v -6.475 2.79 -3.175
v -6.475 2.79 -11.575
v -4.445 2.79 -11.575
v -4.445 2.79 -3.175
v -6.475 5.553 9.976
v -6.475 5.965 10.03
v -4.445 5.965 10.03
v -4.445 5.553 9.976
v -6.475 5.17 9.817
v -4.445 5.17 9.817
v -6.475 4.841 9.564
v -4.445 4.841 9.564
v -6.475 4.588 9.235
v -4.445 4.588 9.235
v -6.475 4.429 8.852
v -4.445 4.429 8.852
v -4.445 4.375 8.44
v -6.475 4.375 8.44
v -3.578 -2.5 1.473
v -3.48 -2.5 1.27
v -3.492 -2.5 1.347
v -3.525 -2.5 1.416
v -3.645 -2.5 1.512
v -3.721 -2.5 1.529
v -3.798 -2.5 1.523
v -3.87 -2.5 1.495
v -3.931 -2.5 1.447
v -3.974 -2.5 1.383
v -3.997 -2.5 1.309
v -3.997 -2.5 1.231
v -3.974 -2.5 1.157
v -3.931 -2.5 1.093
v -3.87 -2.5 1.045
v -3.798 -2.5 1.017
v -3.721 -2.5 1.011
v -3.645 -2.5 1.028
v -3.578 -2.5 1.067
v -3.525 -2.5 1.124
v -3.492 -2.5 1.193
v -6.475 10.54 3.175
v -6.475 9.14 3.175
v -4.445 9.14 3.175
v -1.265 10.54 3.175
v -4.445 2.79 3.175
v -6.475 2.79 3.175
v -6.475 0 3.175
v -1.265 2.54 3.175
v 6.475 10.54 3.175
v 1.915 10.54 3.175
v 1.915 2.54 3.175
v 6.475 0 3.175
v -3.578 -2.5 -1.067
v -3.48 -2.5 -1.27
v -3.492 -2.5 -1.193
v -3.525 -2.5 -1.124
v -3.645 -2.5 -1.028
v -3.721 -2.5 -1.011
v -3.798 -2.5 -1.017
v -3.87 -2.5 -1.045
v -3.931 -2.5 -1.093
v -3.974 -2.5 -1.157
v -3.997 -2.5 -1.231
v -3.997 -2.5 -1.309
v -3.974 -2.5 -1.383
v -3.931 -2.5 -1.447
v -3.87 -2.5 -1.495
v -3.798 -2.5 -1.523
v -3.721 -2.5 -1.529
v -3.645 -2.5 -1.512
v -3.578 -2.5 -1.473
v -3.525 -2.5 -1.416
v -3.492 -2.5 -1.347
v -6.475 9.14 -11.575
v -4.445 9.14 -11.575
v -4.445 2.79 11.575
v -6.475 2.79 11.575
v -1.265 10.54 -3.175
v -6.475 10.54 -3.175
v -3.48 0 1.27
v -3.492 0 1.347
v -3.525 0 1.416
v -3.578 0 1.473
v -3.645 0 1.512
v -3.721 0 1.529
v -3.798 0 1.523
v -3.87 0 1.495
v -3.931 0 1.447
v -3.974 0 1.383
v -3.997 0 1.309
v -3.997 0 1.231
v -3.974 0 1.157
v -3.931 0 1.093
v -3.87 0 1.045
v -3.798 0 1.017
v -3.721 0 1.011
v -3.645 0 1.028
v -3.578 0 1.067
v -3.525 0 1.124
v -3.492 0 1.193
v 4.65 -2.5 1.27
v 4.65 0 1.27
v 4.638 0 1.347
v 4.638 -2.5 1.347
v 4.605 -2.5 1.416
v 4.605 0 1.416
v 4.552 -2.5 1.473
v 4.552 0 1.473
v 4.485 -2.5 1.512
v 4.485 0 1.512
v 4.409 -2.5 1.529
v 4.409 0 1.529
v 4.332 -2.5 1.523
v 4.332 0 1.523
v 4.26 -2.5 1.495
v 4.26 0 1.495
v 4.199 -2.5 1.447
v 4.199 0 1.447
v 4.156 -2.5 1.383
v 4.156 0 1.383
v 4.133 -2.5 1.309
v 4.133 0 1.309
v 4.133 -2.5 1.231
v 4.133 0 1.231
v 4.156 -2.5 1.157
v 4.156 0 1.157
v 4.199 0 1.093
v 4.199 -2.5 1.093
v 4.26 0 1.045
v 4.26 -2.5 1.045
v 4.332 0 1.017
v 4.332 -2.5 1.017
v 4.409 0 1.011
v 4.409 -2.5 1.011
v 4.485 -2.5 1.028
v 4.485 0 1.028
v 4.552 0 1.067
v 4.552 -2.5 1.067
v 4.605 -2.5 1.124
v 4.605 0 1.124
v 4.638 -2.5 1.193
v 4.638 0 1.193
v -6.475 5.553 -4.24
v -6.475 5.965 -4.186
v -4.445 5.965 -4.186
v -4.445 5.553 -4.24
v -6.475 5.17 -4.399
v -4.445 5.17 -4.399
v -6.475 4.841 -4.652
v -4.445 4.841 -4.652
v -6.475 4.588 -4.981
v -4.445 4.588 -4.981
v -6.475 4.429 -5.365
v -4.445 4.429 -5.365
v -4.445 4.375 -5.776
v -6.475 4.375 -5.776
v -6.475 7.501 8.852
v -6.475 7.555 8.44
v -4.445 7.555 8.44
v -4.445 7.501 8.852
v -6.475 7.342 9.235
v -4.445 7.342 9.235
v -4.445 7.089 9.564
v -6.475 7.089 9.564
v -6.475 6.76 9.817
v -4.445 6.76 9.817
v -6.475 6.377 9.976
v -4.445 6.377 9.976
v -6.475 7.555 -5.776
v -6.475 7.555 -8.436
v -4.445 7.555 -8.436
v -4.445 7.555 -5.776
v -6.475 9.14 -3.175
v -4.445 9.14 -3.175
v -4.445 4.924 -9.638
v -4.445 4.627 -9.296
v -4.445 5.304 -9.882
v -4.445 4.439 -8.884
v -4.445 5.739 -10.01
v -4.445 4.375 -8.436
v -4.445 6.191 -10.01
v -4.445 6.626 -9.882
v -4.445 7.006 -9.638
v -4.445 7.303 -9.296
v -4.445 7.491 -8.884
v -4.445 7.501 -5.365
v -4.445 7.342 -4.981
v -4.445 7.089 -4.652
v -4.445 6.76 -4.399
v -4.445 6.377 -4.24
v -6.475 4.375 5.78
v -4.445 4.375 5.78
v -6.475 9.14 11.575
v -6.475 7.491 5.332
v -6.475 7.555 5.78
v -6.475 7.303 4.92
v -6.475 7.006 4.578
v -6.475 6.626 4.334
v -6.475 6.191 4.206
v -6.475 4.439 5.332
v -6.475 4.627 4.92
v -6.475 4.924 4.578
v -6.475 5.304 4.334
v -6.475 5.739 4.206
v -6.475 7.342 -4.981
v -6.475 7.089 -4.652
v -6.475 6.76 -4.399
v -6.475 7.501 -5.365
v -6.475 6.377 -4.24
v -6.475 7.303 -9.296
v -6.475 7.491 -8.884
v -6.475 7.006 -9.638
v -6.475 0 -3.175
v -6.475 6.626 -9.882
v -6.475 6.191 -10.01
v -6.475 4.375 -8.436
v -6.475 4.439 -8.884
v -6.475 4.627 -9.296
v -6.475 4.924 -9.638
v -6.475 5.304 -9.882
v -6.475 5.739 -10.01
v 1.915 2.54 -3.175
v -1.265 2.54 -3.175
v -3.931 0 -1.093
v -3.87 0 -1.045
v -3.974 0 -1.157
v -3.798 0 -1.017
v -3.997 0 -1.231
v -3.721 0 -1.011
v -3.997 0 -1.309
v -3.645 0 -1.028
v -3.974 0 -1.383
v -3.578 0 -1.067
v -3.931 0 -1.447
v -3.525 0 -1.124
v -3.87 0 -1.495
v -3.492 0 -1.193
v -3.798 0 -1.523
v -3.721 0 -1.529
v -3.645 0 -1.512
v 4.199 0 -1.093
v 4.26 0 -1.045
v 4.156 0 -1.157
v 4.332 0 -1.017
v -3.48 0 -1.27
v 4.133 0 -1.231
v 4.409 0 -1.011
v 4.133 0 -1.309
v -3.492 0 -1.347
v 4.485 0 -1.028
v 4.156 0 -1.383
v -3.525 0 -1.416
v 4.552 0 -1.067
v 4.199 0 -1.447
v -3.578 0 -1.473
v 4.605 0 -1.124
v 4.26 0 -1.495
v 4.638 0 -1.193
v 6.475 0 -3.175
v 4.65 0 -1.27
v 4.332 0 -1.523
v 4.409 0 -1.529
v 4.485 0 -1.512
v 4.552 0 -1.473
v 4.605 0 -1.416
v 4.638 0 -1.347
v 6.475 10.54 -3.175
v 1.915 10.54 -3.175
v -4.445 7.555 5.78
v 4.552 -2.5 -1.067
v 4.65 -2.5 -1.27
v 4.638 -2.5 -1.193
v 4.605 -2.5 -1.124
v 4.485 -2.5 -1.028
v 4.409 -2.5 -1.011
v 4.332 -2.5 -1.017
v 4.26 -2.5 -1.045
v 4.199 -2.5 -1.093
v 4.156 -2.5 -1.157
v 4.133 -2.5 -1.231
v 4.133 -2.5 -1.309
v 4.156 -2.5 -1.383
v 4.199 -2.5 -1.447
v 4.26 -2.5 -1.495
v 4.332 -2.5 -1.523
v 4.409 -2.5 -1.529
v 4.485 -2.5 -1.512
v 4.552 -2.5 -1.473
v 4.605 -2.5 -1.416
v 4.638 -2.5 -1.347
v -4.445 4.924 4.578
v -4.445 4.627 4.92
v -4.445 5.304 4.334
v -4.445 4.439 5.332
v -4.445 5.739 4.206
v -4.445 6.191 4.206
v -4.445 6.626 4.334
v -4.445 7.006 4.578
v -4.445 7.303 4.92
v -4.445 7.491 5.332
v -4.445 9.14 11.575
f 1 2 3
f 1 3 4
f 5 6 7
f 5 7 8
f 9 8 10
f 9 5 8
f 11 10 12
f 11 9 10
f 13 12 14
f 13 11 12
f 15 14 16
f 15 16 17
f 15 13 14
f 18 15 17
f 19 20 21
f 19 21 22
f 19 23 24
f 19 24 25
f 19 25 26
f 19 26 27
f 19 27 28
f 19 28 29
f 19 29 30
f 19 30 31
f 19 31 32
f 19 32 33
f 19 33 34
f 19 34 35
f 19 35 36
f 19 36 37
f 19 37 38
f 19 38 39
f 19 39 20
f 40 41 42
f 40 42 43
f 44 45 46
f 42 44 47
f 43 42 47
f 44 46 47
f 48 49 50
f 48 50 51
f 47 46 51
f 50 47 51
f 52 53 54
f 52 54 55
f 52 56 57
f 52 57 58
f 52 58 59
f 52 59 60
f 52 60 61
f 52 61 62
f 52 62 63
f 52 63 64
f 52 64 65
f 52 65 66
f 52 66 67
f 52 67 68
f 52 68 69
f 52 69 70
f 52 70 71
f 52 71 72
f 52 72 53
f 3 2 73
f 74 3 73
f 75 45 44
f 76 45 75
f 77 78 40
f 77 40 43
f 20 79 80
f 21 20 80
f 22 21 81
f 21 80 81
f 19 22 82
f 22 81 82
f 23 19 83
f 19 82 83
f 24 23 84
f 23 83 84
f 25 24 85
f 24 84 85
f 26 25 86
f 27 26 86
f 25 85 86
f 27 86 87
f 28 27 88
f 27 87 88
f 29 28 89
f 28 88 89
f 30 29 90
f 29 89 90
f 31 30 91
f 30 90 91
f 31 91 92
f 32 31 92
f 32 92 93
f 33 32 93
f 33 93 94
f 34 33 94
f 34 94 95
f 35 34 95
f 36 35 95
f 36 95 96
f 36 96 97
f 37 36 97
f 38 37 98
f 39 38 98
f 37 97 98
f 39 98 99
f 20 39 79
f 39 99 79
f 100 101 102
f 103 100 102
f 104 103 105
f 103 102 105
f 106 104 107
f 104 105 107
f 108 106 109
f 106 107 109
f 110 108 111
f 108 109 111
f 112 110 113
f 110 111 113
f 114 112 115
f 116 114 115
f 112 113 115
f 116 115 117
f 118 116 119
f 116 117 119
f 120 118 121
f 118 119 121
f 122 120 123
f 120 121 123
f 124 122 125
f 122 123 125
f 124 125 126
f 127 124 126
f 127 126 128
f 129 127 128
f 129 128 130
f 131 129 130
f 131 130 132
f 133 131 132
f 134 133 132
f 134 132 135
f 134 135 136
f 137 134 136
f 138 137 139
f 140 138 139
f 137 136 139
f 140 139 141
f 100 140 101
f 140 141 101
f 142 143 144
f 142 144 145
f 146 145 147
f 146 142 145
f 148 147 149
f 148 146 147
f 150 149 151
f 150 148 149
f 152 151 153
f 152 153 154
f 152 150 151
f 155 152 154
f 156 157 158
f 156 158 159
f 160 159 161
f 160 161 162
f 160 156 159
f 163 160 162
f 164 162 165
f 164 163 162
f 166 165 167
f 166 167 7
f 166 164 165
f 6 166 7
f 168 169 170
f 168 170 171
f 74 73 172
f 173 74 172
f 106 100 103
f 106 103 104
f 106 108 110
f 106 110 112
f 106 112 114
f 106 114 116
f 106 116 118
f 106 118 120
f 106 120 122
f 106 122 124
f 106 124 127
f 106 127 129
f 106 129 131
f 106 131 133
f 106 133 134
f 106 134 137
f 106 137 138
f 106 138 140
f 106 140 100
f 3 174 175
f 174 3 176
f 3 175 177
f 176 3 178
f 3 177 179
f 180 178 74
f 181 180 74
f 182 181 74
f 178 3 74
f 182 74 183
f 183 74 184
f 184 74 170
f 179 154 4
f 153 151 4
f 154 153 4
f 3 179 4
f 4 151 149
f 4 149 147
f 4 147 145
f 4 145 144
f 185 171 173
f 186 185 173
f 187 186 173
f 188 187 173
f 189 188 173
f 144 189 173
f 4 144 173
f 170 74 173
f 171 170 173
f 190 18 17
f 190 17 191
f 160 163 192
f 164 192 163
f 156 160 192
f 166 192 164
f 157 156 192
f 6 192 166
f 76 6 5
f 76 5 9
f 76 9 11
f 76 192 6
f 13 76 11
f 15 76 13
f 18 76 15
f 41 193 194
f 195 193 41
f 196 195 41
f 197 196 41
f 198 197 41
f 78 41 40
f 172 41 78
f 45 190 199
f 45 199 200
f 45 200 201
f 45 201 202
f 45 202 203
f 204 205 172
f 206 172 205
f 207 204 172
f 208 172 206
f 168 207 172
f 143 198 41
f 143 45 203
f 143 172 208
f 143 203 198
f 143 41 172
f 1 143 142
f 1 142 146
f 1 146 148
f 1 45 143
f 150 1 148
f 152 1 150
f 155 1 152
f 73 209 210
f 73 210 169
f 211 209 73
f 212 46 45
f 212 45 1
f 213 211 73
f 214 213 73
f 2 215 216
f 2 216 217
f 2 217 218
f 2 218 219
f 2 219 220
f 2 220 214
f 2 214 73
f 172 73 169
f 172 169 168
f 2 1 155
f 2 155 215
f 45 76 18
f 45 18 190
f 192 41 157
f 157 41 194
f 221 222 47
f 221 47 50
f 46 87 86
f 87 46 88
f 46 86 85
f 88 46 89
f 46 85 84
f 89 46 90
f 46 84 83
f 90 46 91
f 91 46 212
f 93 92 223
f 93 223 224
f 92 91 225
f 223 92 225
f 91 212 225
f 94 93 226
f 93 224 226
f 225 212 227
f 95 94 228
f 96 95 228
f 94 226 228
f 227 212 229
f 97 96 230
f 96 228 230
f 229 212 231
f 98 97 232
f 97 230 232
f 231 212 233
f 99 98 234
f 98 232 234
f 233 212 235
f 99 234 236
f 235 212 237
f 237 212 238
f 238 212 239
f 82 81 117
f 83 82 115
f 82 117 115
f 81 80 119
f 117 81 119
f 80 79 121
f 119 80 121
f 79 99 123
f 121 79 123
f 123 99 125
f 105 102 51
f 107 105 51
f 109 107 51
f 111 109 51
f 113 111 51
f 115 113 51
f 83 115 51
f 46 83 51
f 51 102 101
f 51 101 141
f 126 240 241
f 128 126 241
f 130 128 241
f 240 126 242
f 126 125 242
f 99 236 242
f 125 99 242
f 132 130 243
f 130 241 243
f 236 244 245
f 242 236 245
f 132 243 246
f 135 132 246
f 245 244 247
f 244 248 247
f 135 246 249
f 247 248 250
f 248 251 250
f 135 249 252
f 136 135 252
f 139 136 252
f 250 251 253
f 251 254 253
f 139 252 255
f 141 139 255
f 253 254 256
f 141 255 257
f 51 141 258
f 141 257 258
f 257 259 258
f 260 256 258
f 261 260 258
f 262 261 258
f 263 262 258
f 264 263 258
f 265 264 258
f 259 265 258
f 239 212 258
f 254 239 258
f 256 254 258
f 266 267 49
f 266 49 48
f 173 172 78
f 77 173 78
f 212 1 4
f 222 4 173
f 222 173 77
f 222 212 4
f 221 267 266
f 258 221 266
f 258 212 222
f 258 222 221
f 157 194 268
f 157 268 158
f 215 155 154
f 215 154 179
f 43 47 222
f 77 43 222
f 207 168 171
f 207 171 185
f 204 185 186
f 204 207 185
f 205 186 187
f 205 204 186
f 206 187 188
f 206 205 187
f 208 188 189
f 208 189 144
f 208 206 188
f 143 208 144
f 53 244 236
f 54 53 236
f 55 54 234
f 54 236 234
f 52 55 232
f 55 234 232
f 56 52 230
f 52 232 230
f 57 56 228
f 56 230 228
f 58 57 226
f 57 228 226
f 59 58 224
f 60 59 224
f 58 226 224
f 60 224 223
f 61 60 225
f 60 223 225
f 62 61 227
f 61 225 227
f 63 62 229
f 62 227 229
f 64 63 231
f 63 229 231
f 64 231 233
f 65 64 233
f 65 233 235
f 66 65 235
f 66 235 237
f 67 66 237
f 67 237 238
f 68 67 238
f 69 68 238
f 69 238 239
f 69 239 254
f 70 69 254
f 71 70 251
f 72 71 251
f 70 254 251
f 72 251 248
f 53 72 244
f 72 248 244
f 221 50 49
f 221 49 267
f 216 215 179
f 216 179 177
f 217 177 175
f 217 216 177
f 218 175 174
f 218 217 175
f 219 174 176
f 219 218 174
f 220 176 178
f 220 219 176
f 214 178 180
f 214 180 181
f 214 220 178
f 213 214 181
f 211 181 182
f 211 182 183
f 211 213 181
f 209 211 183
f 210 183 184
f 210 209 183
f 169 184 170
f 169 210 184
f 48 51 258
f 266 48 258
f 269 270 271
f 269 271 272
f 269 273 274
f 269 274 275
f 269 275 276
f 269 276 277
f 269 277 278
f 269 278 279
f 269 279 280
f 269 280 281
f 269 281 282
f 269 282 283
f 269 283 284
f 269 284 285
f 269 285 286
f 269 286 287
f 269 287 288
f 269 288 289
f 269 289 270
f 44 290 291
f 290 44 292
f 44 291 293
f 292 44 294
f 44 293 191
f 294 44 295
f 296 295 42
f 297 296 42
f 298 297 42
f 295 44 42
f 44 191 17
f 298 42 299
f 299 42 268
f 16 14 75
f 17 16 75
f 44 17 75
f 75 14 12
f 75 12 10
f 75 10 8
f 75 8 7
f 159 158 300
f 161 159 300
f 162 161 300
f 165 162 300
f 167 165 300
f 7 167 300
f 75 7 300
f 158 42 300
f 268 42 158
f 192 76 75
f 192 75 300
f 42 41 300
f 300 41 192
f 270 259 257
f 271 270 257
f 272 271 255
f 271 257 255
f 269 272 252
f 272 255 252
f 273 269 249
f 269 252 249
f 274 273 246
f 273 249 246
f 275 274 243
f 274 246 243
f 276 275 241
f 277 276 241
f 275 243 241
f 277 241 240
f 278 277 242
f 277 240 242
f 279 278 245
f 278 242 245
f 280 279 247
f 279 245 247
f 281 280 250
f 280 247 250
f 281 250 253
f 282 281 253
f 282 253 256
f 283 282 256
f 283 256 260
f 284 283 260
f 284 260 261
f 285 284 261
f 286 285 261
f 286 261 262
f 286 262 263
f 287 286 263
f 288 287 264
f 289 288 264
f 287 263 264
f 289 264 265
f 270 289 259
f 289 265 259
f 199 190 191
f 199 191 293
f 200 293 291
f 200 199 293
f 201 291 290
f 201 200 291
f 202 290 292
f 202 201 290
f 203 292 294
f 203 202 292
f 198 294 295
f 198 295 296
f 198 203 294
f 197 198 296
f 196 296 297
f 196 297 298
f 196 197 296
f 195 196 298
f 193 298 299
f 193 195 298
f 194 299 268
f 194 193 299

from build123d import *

# Parameters (mm, degrees)
SKETCH2_W           = 12.95
SKETCH2_H           = 6.35
BOSS_EXTRUDE1_DEPTH = 2.54
SKETCH3_W           = 5.21
SKETCH3_H           = 6.35
SKETCH3_W_2         = 4.56
BOSS_EXTRUDE2_DEPTH = 8
SKETCH5_R           = 0.26
BOSS_EXTRUDE5_DEPTH = 2.5
SKETCH6_W           = 8.4
SKETCH6_H           = 6.35
BOSS_EXTRUDE6_DEPTH = 2.03


with BuildPart() as part:
    # Sketch2 → Boss-Extrude1 (new body)
    with BuildSketch(Plane(origin=(0, 0, 0), x_dir=(1, 0, 0), z_dir=(0, 1, 0))):
        Rectangle(SKETCH2_W, SKETCH2_H)
    extrude(amount=BOSS_EXTRUDE1_DEPTH)

    # Sketch3 → Boss-Extrude2 (add)
    with BuildSketch(Plane(origin=(0, 2.54, 0), x_dir=(1, 0, 0), z_dir=(0, 1, 0))):
        with Locations((-3.87, 0)):
            Rectangle(SKETCH3_W, SKETCH3_H)
        with Locations((4.195, 0)):
            Rectangle(SKETCH3_W_2, SKETCH3_H)
    extrude(amount=BOSS_EXTRUDE2_DEPTH)

    # Sketch5 → Boss-Extrude5 (add)
    with BuildSketch(Plane.XZ):
        with Locations((-3.74, -1.27)):
            Circle(SKETCH5_R)
        with Locations((-3.74, 1.27)):
            Circle(SKETCH5_R)
        with Locations((4.39, -1.27)):
            Circle(SKETCH5_R)
        with Locations((4.39, 1.27)):
            Circle(SKETCH5_R)
    extrude(amount=BOSS_EXTRUDE5_DEPTH)

    # Sketch6 → Boss-Extrude6 (add)
    with BuildSketch(Plane.ZY.offset(6.475)):
        with Locations((-7.375, 5.965)):
            Rectangle(SKETCH6_W, SKETCH6_H)
        with BuildLine():
            ThreePointArc((-8.436140087, 4.375), (-10.026140087, 5.965), (-8.436140087, 7.555))
            Line((-8.436140087, 7.555), (-5.776140087, 7.555))
            ThreePointArc((-5.776140087, 7.555), (-4.651840305, 7.089299782), (-4.186140087, 5.965))
            ThreePointArc((-4.186140087, 5.965), (-4.651840305, 4.840700218), (-5.776140087, 4.375))
            Line((-5.776140087, 4.375), (-8.436140087, 4.375))
        make_face(mode=Mode.SUBTRACT)
        with Locations((7.375, 5.965)):
            Rectangle(SKETCH6_W, SKETCH6_H)
        with BuildLine():
            ThreePointArc((5.78, 4.375), (4.19, 5.965), (5.78, 7.555))
            Line((5.78, 7.555), (8.44, 7.555))
            ThreePointArc((8.44, 7.555), (9.564299782, 7.089299782), (10.03, 5.965))
            ThreePointArc((10.03, 5.965), (9.564299782, 4.840700218), (8.44, 4.375))
            Line((8.44, 4.375), (5.78, 4.375))
        make_face(mode=Mode.SUBTRACT)
    extrude(amount=-BOSS_EXTRUDE6_DEPTH)


solid = part.part
